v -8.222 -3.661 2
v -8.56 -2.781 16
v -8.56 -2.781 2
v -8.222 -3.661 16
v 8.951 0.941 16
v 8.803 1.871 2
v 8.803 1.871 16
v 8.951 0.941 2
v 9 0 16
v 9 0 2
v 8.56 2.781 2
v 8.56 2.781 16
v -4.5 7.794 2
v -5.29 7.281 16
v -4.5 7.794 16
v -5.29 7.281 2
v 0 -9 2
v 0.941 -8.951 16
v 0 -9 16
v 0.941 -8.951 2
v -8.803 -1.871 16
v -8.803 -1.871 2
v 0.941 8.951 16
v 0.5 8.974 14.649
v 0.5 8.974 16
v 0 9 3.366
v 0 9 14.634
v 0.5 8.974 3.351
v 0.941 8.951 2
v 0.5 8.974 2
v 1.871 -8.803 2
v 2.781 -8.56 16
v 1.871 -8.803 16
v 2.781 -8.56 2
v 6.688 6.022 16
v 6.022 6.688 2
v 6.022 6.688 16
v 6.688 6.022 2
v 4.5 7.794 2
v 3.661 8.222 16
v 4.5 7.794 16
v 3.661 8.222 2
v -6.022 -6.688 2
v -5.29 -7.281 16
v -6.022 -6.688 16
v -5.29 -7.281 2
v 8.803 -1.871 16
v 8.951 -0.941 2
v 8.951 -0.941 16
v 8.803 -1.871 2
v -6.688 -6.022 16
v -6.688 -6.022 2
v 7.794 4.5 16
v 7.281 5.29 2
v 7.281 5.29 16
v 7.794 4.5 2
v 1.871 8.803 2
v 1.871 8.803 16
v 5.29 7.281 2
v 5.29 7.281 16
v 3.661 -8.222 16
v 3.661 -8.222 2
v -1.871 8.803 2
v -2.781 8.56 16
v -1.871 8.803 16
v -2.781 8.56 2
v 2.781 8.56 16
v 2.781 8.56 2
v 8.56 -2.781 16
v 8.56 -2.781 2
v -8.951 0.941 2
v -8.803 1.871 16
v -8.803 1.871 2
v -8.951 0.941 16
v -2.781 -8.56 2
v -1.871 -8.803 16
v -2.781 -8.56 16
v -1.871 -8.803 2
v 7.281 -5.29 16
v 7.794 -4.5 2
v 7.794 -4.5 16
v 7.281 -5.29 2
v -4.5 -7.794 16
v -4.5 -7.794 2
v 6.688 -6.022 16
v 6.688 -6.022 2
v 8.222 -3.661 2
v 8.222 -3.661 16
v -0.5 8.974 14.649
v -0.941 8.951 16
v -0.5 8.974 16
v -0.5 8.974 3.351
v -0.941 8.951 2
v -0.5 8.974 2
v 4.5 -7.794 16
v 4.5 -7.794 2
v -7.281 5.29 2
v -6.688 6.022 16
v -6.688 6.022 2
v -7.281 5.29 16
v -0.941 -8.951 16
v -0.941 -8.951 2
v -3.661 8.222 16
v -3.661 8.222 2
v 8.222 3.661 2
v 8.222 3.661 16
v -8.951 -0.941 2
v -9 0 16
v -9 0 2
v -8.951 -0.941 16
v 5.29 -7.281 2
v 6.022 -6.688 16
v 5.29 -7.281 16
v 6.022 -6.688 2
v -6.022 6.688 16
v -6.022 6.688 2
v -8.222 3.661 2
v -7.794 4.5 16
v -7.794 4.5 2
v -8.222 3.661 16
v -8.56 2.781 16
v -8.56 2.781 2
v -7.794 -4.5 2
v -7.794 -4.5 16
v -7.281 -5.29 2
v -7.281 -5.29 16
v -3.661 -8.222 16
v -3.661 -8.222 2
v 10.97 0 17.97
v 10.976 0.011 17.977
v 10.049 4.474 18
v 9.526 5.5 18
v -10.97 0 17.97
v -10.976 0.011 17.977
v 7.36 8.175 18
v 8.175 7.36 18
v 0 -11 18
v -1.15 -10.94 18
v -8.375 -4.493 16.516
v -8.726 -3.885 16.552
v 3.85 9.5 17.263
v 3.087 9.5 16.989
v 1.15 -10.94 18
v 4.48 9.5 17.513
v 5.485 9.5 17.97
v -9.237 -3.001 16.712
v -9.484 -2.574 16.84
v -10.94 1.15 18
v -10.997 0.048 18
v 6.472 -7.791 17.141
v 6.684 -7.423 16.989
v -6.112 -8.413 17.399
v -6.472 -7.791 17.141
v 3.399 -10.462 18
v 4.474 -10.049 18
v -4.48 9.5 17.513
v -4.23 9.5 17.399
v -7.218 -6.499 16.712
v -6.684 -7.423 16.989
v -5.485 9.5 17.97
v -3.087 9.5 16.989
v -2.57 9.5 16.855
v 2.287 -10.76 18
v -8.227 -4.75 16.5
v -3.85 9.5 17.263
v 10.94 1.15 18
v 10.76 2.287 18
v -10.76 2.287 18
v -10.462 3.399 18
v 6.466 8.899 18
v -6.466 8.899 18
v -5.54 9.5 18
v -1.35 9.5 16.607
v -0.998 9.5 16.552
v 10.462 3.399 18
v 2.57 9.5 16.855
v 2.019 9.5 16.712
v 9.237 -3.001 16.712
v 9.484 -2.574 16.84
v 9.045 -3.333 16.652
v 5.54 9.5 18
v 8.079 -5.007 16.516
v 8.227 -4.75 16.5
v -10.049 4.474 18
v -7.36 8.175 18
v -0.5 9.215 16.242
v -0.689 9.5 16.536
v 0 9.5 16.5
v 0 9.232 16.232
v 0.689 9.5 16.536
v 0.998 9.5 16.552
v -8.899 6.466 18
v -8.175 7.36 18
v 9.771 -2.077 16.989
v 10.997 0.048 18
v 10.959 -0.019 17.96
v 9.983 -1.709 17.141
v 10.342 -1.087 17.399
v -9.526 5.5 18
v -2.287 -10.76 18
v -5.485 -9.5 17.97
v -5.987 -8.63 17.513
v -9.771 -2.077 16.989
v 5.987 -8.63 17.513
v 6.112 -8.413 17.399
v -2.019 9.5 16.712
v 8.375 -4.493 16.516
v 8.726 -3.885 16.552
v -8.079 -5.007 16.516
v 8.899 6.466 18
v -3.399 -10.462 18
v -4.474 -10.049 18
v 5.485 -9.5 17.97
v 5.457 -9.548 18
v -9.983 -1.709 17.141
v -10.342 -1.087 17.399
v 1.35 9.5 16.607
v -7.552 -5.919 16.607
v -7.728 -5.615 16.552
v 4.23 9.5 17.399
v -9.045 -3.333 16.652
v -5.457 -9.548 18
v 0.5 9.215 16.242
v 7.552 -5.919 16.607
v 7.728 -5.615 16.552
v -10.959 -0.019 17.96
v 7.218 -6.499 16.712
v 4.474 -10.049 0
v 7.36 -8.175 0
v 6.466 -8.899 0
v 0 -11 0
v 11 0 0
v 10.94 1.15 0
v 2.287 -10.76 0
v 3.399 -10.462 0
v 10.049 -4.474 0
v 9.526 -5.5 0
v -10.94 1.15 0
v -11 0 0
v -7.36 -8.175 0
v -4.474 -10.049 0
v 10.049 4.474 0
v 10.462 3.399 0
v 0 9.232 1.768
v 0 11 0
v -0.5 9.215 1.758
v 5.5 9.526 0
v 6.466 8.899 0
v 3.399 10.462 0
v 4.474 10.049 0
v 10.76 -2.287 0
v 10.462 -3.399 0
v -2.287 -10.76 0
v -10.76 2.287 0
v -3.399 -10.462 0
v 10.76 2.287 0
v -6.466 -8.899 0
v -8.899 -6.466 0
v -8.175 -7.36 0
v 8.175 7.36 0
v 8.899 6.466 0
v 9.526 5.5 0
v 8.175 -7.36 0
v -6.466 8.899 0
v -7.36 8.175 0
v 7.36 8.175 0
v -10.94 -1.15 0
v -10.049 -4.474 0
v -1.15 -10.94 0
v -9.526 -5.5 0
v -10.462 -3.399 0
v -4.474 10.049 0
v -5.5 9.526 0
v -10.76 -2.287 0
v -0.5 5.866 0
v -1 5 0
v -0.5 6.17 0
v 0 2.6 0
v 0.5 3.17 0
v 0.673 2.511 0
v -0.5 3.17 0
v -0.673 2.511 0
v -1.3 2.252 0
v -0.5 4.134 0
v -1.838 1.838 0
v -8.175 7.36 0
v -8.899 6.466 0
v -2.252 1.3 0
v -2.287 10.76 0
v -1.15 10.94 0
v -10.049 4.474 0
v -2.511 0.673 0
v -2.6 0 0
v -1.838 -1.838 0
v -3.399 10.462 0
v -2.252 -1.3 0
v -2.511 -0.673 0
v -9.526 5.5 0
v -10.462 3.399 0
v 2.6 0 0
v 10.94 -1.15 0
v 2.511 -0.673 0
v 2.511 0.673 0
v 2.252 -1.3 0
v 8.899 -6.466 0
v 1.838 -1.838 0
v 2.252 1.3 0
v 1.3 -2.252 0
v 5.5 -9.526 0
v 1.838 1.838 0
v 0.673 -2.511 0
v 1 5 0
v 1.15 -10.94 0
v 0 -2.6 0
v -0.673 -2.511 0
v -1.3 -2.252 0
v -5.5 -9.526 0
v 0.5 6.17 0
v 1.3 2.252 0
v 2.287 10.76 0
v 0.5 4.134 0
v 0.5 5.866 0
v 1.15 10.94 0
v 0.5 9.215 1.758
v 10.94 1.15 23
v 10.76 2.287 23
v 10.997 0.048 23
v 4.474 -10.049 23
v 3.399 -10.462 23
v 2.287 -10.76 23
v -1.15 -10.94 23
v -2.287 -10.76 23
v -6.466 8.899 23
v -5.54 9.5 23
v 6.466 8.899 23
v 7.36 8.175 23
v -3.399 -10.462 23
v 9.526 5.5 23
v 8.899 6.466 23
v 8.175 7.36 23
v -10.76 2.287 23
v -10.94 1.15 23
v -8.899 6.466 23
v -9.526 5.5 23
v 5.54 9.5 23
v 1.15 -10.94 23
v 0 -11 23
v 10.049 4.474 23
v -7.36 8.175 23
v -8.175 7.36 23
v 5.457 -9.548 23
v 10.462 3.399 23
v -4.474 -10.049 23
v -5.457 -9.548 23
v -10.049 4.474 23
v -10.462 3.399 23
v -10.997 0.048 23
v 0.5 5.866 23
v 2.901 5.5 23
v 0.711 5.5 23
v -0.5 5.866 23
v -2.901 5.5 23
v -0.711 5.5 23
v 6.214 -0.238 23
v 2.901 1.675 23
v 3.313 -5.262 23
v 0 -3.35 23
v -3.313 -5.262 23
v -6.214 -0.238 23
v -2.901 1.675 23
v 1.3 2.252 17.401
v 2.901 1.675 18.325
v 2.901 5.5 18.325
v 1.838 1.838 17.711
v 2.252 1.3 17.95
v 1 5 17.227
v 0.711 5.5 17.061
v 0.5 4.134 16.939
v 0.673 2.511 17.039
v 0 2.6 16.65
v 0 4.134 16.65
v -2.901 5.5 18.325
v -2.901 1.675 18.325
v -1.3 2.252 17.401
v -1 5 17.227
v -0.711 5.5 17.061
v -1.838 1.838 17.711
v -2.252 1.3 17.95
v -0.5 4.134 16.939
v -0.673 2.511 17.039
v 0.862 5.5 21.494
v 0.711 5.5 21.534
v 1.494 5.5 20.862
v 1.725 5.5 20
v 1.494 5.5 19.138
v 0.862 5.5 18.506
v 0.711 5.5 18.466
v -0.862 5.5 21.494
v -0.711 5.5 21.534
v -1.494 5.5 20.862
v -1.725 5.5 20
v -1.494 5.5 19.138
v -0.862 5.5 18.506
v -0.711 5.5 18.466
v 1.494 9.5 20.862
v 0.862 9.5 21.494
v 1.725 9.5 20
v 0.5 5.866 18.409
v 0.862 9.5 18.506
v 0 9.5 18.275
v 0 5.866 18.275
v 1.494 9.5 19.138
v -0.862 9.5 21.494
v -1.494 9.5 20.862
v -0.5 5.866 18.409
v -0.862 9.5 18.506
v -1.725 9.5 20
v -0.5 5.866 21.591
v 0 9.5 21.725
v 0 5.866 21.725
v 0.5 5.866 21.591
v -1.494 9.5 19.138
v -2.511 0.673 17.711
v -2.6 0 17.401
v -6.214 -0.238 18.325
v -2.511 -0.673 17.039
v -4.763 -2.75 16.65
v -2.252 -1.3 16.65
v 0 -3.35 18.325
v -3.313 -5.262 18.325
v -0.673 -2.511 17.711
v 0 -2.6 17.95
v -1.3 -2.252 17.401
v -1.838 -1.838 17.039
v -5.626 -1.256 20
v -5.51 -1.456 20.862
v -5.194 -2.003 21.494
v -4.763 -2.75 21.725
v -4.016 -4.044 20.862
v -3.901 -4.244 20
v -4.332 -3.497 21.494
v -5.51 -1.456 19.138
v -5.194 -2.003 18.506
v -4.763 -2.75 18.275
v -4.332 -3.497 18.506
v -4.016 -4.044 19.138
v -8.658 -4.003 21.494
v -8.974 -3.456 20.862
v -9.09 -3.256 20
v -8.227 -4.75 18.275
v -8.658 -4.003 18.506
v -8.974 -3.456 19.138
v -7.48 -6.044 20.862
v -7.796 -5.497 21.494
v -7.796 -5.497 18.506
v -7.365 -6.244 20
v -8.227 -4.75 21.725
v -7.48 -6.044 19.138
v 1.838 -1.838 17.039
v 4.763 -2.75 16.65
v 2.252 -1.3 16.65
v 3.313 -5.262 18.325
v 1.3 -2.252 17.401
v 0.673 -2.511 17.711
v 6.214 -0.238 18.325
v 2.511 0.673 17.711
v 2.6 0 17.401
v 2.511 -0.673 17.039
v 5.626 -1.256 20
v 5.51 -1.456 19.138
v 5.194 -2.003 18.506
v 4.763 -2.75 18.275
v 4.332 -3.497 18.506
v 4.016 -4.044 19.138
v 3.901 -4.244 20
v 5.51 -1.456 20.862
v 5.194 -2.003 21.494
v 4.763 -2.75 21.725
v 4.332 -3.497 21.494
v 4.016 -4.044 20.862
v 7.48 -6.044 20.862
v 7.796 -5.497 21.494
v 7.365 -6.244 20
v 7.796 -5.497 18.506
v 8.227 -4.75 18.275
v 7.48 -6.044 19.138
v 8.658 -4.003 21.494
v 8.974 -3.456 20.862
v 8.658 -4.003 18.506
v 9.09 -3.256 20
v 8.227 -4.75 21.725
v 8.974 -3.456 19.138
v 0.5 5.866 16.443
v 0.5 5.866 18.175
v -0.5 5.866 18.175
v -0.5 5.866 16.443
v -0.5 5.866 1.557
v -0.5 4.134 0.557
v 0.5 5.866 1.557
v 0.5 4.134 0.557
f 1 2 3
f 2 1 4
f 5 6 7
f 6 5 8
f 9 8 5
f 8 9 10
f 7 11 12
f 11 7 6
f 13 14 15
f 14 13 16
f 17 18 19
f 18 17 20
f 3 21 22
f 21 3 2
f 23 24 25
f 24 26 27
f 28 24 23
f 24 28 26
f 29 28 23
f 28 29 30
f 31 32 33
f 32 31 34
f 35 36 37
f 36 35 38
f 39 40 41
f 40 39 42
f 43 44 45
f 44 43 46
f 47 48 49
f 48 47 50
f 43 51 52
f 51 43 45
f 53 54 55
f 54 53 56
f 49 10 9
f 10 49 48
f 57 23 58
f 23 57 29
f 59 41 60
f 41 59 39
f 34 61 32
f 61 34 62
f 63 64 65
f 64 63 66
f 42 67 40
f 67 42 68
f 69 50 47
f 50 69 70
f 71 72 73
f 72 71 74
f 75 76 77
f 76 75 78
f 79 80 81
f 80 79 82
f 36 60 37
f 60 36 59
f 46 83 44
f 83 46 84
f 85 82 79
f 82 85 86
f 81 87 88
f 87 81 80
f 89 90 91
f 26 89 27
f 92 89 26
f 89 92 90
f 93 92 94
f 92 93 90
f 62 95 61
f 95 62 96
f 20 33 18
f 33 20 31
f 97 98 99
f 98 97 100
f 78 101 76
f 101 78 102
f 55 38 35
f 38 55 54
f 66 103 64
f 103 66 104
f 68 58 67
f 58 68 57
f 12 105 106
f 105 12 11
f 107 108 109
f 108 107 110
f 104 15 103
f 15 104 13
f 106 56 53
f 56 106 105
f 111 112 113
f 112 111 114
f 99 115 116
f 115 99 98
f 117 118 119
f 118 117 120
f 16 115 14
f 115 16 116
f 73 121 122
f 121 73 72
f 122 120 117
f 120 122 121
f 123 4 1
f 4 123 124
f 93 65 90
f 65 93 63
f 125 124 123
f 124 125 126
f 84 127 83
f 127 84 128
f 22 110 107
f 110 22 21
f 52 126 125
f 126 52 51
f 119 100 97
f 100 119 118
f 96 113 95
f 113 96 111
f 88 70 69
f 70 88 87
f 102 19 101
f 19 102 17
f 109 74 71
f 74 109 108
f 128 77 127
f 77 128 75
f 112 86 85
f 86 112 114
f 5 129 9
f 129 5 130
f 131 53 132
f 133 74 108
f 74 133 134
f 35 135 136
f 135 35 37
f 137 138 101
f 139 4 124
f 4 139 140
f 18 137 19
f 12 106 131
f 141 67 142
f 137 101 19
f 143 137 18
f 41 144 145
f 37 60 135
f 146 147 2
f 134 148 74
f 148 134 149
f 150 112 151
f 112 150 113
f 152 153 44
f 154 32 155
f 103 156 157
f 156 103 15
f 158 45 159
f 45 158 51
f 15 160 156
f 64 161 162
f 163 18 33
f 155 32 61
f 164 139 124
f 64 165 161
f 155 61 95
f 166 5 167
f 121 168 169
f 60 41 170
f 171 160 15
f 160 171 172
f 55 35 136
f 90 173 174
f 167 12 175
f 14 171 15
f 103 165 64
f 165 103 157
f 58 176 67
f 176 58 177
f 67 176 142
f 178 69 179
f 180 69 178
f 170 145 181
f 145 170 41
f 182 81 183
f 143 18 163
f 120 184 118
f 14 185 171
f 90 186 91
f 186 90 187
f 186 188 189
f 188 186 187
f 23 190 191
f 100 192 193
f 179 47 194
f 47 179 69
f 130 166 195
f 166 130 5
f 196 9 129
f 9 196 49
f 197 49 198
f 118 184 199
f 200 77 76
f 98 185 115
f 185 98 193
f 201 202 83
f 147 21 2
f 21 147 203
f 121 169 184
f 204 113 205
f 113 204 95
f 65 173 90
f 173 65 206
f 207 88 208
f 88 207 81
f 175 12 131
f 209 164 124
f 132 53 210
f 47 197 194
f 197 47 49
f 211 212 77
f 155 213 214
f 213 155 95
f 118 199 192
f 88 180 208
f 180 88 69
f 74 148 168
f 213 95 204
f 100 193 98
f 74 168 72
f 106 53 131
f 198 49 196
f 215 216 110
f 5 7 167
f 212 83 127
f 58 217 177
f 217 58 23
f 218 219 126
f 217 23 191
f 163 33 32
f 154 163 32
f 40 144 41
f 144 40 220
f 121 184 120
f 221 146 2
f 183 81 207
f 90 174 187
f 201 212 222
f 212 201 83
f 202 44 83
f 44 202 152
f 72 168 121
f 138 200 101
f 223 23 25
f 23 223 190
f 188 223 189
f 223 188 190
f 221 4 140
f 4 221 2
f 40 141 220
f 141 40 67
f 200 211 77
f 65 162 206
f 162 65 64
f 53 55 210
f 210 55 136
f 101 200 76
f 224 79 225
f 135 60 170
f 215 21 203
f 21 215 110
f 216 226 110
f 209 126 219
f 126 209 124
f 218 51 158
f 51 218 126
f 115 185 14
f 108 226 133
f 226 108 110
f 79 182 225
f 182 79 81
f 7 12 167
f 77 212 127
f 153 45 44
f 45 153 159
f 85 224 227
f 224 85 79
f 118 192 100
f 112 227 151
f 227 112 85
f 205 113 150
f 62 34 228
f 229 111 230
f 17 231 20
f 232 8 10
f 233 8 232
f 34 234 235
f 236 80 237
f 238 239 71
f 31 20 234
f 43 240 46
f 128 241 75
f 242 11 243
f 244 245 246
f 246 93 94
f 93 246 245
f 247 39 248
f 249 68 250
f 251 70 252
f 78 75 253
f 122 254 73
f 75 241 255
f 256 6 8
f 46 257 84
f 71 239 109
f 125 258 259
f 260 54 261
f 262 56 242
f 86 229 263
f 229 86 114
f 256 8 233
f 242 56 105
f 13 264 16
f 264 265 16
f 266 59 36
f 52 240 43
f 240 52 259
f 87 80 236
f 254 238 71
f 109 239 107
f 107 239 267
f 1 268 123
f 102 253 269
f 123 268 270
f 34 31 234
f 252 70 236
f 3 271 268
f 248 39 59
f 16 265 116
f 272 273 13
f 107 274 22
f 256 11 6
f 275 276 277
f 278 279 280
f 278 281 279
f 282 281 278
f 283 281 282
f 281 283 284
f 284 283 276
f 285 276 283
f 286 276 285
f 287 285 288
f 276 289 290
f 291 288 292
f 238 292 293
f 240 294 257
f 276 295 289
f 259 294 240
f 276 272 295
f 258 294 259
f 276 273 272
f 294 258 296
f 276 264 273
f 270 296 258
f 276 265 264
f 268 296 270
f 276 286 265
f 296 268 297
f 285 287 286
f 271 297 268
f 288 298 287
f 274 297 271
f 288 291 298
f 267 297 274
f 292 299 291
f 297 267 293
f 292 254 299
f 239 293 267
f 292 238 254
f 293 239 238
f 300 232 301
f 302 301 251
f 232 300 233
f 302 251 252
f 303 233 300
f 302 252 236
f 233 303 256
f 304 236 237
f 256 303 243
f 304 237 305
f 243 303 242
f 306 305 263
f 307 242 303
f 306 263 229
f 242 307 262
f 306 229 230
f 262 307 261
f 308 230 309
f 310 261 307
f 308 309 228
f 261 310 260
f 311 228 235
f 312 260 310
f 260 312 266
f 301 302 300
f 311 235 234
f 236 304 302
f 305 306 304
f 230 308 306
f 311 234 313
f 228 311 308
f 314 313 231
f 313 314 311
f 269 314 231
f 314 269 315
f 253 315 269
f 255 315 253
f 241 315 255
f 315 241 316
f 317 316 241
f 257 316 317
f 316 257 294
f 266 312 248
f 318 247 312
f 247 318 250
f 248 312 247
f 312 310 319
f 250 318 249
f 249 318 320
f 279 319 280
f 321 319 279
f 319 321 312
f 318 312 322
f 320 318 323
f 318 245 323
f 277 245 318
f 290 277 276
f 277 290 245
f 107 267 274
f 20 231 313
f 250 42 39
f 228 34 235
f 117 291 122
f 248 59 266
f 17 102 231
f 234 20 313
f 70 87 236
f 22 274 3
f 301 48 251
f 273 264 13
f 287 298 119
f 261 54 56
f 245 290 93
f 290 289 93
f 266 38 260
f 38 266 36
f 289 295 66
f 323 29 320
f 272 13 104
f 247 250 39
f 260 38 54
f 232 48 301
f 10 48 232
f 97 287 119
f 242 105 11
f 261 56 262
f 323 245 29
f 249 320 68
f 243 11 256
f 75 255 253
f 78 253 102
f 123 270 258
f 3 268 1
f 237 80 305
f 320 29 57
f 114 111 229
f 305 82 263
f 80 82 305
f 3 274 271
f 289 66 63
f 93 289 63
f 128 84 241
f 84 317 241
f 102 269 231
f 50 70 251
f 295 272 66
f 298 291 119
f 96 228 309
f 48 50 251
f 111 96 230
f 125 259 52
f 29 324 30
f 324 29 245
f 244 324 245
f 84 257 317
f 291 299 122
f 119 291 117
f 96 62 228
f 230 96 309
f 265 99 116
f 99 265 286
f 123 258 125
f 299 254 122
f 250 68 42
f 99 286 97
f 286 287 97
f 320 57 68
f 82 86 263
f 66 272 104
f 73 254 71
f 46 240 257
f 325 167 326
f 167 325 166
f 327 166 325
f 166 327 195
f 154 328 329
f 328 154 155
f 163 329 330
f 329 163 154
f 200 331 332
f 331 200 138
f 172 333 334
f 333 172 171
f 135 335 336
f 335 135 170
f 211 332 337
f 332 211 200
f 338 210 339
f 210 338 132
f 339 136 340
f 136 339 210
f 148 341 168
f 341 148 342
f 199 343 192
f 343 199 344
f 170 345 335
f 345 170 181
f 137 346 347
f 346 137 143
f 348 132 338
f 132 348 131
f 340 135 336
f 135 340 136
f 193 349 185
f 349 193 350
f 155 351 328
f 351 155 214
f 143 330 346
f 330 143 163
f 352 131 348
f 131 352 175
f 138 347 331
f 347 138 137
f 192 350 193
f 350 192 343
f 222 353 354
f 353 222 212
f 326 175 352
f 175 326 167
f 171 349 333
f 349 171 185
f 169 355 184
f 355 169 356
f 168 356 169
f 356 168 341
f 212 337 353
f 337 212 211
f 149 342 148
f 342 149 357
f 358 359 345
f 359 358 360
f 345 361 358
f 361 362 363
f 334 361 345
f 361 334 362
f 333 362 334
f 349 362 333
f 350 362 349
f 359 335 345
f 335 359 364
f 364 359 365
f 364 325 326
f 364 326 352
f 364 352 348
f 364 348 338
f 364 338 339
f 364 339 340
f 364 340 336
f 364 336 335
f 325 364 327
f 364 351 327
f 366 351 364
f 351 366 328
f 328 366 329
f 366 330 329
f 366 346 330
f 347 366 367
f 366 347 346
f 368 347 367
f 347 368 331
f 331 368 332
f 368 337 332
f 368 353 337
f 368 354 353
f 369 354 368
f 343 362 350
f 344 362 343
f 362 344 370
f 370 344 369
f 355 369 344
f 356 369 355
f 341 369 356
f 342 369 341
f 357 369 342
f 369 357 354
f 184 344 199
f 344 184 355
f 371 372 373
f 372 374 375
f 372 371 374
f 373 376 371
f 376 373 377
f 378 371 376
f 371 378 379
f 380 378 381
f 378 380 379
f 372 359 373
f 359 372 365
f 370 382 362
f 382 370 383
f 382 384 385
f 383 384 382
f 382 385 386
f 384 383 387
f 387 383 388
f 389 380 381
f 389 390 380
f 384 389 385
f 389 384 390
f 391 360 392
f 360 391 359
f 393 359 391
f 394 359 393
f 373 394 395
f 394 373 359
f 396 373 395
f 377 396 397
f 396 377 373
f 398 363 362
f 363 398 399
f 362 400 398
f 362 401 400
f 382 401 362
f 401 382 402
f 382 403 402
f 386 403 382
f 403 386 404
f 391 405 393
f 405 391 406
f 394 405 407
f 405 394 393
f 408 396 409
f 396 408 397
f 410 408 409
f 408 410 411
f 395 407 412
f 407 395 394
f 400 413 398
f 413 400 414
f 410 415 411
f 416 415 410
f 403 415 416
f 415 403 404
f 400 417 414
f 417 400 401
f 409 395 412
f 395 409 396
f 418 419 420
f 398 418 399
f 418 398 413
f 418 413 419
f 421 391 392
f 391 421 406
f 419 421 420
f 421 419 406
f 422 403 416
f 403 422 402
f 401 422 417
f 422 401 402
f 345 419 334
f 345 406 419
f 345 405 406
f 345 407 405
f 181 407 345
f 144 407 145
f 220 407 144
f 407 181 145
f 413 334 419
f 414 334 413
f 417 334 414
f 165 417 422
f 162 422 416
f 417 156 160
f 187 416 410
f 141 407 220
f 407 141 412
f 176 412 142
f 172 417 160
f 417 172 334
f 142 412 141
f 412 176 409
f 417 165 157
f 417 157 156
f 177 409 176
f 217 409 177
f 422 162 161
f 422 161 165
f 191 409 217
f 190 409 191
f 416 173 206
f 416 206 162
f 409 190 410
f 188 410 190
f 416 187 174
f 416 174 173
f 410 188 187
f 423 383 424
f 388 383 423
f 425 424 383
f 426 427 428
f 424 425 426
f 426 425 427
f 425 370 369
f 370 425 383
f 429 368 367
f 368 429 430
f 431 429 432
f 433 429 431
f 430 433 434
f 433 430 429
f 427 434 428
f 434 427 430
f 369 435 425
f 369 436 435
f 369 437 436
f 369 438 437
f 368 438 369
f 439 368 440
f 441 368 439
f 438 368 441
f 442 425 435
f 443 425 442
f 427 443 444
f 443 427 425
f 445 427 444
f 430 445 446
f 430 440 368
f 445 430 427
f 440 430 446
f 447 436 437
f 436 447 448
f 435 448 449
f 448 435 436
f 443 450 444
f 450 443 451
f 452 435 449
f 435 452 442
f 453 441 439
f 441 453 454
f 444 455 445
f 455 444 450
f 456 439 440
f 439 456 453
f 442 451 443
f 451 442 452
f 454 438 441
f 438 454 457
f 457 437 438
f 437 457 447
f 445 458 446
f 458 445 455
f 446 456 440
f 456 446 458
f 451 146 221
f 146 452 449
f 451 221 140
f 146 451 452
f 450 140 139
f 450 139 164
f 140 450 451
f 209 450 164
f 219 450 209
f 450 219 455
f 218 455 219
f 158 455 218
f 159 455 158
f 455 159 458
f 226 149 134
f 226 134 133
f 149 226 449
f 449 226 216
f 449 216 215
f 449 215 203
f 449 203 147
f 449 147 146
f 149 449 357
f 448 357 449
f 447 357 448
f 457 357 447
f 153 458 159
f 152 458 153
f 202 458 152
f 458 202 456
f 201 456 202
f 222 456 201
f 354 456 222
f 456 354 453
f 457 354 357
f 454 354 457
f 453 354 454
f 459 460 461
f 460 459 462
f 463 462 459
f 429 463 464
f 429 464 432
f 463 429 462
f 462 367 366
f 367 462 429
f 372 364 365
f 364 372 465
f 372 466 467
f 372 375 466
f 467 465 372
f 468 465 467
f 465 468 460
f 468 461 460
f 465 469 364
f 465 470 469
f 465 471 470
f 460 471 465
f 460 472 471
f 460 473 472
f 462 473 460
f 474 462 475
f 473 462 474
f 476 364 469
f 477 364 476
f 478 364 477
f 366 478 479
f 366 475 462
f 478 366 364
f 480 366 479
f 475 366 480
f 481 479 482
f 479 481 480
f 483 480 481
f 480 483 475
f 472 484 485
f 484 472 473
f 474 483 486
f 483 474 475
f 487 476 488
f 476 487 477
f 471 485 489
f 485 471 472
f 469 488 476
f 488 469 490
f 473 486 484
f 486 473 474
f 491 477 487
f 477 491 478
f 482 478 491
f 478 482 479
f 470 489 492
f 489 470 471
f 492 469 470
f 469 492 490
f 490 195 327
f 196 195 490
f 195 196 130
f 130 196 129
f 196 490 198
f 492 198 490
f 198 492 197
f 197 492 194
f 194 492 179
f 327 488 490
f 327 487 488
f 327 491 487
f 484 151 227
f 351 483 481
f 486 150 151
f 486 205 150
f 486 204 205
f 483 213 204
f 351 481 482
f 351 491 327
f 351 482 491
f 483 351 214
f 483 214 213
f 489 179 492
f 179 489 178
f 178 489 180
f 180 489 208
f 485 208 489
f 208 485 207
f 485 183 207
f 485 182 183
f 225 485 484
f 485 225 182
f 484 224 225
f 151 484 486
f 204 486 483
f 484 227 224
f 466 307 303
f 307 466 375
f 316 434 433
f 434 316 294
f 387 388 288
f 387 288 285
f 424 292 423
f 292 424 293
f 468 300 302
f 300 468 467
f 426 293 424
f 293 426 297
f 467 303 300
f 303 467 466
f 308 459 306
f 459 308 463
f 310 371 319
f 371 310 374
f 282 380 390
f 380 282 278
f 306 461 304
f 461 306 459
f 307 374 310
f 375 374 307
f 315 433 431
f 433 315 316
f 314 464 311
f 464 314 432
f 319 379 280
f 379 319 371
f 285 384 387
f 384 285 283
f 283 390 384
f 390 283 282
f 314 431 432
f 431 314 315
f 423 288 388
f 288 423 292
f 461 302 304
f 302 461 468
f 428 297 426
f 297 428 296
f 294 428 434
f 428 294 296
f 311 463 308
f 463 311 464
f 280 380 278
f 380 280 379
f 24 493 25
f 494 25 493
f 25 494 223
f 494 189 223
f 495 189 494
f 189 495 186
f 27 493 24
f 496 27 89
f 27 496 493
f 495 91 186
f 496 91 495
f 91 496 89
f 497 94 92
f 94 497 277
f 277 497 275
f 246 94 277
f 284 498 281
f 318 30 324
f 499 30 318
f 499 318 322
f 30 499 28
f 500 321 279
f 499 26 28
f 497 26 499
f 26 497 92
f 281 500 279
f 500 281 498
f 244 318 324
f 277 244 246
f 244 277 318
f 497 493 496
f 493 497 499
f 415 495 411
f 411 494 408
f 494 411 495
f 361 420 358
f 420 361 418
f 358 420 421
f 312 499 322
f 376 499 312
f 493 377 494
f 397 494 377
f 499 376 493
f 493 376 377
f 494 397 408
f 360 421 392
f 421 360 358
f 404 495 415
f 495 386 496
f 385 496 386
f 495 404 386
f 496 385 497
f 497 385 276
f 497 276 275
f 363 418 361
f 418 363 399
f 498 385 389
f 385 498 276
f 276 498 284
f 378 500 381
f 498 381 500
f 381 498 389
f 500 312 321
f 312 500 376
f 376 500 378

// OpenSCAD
// file: configuration.scad
// Increase this if your slicer or printer make holes too tight.
extra_radius = 0.1;

// OD = outside diameter, corner to corner.
m3_nut_od = 6.1;
m3_nut_radius = m3_nut_od/2 + 0.2 + extra_radius;
m3_washer_radius = 3.5 + extra_radius;

// Major diameter of metric 3mm thread.
m3_major = 2.85;
m3_radius = m3_major/2 + extra_radius;
m3_wide_radius = m3_major/2 + extra_radius + 0.2;

// NEMA17 stepper motors.
motor_shaft_diameter = 5;
motor_shaft_radius = motor_shaft_diameter/2 + extra_radius;

// Frame brackets. M3x8mm screws work best with 3.6 mm brackets.
thickness = 3.6;

// OpenBeam or Misumi. Currently only 15x15 mm, but there is a plan
// to make models more parametric and allow 20x20 mm in the future.
extrusion = 15;

// Placement for the NEMA17 stepper motors.
motor_offset = 44;
motor_length = 47;
// main file
include <configuration.scad>;

radius = 9;
width = 16;
top = 5;
smoothness = 60;

module spool() {
  difference() {
    union() {
      cylinder(r=radius, h=width, center=true, $fn=smoothness);
      translate([0, 0, width/2])
	cylinder(r1=radius, r2=radius+2, h=2, center=true, $fn=smoothness);
      translate([0, 0, -width/2])
	cylinder(r2=radius, r1=radius+2, h=2, center=true, $fn=smoothness);
      translate([0, 0, width/2+top/2+1])
	cylinder(r=radius+2, h=top, center=true, $fn=smoothness);
    }
    // Motor shaft.
    cylinder(r=motor_shaft_radius, h=50, center=true, $fn=24);
    // Filament tunnels.
    translate([0, radius, width/2-1.5]) rotate([-30, 0, 0])
      #cube([1, 2*radius, 1.5], center=true);
    translate([0, radius, -width/2+1.5]) rotate([30, 0, 0])
      #cube([1, 2*radius, 1.5], center=true);
    translate([0, 5, 0])
      #cylinder(r=1, h=40, center=true, $fn=6);
    // M3 screws and nuts on three sides.
    for (a = [0:120:359]) {
      rotate([0, 0, a]) translate([0, 4.5, width/2+3]) rotate([90, 0, 0]) {
	cylinder(r=m3_wide_radius, h=radius+5, center=true, $fn=12);
	translate([0, 0, 1-radius]) cylinder(r=10, h=6, center=true);
	for (z = [0:10]) {
	  translate([0, z, 1.5]) rotate([0, 0, 30])
	    cylinder(r=m3_nut_radius, h=5, center=true, $fn=6);
	}
      }
    }
  }
}

translate([0, 0, width/2+1]) spool();
